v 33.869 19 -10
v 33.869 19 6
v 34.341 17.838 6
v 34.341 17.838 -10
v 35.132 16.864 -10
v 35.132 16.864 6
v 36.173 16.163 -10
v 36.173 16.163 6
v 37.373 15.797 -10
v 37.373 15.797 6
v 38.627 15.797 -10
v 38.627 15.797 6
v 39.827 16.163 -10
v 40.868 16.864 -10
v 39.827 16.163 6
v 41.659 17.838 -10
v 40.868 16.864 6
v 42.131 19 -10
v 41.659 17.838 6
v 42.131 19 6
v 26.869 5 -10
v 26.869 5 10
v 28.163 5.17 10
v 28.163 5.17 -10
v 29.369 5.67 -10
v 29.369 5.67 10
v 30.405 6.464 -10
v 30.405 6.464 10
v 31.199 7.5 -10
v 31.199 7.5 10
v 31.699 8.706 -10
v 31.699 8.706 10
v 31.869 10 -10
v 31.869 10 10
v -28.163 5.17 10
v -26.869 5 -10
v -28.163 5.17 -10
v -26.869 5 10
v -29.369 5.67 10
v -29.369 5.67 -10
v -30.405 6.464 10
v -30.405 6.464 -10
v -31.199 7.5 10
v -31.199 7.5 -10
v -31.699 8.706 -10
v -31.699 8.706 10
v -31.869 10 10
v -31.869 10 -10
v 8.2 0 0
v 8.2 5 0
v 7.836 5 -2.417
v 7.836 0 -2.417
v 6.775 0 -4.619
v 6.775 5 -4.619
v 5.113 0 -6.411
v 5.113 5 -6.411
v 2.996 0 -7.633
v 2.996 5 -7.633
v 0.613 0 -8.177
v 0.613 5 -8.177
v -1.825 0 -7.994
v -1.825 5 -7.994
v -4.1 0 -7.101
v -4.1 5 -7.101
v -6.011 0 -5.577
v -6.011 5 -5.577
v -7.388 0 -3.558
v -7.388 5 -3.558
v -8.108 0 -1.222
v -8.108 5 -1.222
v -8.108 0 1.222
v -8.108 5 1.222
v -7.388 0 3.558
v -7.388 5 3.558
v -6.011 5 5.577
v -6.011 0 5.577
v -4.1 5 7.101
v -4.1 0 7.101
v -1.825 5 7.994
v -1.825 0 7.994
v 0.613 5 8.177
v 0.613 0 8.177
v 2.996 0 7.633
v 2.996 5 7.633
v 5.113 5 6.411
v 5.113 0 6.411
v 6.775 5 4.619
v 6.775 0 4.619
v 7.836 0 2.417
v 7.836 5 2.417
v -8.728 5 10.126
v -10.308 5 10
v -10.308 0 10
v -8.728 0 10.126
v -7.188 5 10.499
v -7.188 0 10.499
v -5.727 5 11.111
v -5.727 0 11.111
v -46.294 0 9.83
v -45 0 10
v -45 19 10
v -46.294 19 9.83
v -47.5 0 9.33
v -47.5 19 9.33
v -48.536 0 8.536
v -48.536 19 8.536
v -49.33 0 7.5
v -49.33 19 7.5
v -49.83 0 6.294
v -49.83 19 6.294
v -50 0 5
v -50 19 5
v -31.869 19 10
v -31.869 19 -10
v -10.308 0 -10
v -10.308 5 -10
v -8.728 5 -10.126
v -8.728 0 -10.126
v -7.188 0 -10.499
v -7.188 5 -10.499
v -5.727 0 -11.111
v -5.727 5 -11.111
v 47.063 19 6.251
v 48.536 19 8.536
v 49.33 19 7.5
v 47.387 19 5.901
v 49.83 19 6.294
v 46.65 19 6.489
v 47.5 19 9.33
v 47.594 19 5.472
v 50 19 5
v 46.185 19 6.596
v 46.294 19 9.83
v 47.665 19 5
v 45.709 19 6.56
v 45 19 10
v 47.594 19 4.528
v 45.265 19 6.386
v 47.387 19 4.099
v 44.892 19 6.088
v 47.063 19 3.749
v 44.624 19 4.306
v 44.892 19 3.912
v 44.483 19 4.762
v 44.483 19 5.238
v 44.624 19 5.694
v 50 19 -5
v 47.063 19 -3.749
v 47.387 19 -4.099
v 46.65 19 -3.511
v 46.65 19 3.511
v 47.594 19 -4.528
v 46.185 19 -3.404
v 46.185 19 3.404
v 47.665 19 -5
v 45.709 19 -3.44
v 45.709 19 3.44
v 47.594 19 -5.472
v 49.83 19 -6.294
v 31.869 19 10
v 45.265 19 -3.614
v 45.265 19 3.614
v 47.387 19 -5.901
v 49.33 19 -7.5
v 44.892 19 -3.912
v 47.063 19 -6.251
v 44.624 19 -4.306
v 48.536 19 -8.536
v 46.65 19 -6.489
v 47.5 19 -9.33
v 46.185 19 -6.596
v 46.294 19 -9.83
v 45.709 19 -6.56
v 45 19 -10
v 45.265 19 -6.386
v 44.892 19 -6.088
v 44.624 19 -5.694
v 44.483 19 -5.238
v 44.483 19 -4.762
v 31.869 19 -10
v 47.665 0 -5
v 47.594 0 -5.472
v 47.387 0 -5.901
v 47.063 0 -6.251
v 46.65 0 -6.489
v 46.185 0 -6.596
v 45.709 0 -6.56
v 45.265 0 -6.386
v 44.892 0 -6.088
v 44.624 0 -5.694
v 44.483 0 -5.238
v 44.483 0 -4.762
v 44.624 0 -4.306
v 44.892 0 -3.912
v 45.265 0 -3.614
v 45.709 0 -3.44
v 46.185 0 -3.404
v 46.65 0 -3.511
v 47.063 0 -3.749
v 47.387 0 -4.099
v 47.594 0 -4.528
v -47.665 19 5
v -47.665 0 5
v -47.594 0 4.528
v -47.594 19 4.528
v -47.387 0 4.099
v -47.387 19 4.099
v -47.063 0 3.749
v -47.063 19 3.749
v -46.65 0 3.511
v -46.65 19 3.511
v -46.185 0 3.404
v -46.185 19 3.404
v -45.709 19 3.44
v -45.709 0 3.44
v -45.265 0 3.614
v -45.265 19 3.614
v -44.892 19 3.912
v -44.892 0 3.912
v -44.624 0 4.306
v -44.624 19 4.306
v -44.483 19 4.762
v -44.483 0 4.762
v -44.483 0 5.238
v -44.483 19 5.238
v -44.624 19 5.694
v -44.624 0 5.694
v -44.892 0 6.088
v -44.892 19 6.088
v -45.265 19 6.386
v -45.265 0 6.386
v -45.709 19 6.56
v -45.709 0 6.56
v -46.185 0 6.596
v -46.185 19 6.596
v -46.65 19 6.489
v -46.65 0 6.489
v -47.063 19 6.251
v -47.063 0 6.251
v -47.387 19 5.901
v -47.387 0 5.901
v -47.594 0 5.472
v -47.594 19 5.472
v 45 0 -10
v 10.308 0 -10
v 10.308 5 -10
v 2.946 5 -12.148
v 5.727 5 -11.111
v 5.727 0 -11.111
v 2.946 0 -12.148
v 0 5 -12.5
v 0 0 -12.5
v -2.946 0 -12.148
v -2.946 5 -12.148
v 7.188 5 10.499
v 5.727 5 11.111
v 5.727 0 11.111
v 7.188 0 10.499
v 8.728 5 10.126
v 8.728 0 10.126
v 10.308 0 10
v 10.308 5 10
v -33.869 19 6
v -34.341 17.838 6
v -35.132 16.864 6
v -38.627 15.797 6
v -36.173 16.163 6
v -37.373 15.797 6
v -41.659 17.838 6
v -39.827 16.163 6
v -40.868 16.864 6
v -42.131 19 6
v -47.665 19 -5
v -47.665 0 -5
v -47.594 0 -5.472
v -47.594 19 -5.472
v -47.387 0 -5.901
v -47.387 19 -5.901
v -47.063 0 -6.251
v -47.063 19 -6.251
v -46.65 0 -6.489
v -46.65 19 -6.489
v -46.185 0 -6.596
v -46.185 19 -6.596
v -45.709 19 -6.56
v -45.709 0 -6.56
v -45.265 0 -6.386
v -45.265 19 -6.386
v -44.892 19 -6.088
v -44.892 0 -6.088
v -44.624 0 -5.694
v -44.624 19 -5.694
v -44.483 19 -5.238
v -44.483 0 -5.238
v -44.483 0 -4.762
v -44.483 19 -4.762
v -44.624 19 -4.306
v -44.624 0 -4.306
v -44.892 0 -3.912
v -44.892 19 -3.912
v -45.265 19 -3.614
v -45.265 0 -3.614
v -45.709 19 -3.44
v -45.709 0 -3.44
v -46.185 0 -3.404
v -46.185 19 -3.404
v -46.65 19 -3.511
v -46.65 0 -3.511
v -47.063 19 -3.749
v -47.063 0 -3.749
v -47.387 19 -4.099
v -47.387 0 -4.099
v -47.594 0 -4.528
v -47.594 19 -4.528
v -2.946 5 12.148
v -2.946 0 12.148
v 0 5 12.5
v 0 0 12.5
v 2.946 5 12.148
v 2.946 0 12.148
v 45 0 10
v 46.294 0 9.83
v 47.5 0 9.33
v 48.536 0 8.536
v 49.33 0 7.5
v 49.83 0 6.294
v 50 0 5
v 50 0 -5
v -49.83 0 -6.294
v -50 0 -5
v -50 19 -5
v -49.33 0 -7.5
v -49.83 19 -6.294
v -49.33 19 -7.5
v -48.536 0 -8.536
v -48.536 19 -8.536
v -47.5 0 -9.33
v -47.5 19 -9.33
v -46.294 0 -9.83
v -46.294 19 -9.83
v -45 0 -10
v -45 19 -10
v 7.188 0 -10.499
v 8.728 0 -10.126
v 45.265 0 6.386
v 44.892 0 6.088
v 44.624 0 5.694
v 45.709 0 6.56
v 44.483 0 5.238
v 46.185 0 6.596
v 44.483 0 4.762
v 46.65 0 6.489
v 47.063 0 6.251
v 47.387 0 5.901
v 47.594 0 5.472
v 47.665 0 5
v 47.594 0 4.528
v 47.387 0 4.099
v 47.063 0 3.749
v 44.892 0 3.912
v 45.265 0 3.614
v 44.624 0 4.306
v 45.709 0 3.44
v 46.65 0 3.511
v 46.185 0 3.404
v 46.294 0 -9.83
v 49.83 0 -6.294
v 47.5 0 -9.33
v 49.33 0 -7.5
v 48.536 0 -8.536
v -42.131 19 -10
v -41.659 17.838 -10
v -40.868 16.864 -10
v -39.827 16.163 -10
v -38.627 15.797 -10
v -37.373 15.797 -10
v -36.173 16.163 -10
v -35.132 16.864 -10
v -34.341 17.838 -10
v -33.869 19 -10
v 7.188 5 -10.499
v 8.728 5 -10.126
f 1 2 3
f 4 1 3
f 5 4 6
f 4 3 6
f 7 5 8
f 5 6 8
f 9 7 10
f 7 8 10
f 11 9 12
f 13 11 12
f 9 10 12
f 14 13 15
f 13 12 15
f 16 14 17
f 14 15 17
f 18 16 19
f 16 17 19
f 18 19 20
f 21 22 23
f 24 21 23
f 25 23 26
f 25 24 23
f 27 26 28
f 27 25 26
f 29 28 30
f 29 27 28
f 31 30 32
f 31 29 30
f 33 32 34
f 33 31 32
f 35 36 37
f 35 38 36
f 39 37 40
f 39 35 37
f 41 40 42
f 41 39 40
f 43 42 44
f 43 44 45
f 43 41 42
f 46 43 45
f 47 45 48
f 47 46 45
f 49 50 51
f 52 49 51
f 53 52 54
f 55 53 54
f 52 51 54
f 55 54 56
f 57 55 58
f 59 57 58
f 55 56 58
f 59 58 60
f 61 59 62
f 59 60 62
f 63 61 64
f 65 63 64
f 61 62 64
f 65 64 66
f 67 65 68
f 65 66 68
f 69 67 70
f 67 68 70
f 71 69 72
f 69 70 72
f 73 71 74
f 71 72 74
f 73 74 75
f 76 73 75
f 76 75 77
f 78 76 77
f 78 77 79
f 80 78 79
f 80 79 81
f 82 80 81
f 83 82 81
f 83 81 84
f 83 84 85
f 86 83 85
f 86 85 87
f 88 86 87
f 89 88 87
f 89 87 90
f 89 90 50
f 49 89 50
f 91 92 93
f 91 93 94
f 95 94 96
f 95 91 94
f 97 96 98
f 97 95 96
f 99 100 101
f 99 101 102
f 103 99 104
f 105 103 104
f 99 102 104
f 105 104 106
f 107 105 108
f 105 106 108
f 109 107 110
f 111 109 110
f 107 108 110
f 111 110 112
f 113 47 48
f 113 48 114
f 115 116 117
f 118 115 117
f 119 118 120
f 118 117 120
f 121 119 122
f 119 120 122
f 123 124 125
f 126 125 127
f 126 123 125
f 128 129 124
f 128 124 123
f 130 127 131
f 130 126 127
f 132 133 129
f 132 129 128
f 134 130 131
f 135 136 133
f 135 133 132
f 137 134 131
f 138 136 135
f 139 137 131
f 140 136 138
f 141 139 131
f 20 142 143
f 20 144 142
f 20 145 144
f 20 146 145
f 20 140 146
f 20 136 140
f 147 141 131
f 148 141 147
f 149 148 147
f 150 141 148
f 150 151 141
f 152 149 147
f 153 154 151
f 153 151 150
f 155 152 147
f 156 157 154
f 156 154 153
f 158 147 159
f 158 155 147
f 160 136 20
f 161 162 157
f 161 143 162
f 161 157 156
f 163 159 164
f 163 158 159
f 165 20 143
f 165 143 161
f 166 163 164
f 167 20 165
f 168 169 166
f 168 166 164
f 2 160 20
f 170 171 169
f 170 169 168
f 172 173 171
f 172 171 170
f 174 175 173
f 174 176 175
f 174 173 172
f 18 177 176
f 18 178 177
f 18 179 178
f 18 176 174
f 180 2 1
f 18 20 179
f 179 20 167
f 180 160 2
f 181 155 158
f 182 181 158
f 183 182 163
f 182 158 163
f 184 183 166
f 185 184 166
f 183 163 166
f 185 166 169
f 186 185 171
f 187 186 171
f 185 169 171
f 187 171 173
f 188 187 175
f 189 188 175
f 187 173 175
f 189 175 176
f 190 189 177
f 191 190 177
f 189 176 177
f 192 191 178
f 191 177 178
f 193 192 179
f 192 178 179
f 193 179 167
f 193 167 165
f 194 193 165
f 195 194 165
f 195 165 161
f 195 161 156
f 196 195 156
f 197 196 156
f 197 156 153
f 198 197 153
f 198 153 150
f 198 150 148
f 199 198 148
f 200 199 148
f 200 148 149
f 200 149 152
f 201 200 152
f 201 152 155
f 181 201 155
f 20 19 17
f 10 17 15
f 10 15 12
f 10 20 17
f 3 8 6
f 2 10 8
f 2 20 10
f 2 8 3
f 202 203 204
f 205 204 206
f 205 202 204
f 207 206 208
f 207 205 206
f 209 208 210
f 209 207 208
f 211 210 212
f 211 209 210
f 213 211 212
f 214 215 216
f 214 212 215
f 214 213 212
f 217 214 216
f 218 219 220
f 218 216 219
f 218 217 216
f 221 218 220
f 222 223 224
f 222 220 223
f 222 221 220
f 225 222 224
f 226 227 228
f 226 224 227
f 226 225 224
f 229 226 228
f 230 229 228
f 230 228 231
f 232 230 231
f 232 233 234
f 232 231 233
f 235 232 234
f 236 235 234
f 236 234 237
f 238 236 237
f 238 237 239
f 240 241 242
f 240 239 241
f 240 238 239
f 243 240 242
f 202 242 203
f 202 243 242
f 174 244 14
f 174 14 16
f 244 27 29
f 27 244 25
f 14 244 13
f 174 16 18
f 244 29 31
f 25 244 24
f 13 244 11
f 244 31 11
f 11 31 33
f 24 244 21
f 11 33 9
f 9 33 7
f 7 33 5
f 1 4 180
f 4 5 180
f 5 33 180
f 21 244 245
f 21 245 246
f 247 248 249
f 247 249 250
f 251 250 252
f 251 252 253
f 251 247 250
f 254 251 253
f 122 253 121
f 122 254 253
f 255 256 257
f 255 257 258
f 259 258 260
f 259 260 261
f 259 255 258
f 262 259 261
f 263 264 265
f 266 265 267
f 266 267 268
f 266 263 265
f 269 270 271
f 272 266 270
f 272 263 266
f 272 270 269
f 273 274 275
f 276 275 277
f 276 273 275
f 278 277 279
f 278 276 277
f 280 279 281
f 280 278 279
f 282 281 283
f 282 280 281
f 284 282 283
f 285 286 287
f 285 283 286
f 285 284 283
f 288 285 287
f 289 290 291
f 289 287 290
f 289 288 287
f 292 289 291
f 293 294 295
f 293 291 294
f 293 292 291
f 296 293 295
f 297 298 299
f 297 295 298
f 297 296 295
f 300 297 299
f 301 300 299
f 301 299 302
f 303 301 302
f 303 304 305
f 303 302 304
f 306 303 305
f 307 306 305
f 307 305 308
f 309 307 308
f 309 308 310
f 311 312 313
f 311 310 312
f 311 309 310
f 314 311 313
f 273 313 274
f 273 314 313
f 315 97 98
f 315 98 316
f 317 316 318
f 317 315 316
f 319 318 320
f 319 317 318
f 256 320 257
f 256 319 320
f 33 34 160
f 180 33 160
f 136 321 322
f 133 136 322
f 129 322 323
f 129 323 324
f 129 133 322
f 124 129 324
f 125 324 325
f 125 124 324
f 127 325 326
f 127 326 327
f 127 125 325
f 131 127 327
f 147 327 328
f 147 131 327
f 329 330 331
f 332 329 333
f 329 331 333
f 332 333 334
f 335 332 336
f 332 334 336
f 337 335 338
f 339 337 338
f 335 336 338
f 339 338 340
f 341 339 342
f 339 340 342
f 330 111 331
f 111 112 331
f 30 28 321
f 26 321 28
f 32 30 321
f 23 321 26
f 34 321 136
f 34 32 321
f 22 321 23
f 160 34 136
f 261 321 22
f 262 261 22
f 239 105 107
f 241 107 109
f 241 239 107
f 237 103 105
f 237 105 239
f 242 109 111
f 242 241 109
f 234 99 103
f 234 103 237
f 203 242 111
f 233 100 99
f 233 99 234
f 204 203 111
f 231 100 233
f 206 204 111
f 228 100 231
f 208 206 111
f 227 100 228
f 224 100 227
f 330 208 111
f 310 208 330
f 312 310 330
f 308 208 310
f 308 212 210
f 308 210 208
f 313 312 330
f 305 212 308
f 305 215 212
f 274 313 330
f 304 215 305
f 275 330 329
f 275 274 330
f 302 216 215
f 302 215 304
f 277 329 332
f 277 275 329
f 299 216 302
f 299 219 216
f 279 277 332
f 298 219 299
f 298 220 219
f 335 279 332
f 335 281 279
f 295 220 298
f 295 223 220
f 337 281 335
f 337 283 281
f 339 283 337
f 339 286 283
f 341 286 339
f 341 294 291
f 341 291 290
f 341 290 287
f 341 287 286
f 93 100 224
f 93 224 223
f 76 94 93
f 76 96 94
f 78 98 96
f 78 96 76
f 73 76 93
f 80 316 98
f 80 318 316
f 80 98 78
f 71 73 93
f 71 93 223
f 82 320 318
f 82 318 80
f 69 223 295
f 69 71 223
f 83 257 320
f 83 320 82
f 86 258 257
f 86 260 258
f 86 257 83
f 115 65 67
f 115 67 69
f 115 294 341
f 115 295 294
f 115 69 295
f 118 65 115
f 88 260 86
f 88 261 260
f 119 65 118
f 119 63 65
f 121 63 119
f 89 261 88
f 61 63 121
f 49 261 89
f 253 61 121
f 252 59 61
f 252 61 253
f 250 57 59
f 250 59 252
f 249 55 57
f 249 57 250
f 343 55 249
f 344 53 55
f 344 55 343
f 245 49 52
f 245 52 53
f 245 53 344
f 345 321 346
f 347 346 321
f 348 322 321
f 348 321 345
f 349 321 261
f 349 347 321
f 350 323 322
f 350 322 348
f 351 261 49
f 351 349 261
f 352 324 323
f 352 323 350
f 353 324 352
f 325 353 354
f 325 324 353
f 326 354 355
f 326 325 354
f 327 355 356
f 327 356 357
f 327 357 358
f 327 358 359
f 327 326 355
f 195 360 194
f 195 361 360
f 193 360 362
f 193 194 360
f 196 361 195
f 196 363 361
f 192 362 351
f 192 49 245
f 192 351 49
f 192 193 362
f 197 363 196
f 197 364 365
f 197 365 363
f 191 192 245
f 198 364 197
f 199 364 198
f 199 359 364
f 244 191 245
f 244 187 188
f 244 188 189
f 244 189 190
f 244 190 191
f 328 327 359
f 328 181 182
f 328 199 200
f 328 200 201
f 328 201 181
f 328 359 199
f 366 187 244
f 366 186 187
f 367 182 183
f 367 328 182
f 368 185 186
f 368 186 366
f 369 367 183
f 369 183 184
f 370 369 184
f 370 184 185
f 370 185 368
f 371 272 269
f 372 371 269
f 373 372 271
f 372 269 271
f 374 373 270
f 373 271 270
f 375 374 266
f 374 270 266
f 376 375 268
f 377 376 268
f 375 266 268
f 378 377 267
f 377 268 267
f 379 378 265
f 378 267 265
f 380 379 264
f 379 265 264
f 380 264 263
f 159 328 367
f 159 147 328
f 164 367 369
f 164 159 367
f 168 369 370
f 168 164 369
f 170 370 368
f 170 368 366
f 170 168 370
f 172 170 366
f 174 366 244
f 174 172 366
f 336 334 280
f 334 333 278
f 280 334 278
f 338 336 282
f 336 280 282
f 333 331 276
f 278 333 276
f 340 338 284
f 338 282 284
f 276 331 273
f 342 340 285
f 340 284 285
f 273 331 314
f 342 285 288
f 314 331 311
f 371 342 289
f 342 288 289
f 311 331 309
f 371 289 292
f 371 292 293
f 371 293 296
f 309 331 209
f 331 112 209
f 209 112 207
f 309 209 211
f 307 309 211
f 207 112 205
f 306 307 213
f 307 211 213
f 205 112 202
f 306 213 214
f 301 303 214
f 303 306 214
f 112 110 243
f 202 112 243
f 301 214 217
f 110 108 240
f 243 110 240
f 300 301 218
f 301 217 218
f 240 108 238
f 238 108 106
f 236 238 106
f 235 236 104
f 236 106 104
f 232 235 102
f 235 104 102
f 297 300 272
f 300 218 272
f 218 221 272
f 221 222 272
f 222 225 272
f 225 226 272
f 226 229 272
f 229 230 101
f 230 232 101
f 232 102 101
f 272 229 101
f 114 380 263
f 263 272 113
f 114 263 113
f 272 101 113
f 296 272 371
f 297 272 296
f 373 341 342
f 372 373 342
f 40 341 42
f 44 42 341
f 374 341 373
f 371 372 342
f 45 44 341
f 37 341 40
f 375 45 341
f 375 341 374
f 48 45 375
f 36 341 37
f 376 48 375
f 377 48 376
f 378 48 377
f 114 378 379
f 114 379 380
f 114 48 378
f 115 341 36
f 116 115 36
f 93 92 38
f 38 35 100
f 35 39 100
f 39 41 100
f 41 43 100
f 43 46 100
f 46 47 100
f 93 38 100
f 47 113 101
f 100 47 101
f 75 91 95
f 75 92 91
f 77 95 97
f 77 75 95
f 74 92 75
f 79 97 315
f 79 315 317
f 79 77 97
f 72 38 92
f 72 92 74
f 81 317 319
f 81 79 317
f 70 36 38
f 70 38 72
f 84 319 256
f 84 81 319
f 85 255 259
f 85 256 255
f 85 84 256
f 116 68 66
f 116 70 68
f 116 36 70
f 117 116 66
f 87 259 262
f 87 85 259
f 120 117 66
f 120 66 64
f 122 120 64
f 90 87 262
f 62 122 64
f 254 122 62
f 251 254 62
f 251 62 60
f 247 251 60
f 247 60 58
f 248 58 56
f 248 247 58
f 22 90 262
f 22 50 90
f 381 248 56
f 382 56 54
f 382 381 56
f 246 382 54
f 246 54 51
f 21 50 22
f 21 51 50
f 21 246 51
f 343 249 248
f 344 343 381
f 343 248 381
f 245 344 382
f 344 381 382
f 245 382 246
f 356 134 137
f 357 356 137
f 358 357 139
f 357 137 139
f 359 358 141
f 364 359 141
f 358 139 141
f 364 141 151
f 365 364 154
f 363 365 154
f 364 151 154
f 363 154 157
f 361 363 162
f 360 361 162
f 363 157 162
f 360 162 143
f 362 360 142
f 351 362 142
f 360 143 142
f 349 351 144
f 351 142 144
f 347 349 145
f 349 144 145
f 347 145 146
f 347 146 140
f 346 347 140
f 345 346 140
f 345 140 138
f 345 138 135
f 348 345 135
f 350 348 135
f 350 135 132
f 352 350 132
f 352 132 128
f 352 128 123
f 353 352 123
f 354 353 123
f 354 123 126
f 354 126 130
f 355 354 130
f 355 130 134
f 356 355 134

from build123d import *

# Parameters (mm, degrees)
SKETCH1_W               = 88
SKETCH1_H               = 20
BOSS_EXTRUDE1_DEPTH     = 40
SKETCH2_R               = 4.25
CUT_EXTRUDE1_DEPTH      = 21
SKETCH7_R               = 12.5
BOSS_EXTRUDE2_DEPTH     = 40
SKETCH4_R               = 8.2
CUT_EXTRUDE3_DEPTH      = 41
FILLET2_R               = 10
SKETCH9_W               = 27
SKETCH9_H               = 21
CUT_EXTRUDE4_DEPTH      = 89
SKETCH10_W              = 63.73864418
SKETCH10_H              = 16
CUT_EXTRUDE5_DEPTH      = 13.5
CUT_EXTRUDE5_DEPTH_BACK = 13.5
FILLET3_R               = 5
SKETCH11_W              = 20
SKETCH11_H              = 19
BOSS_EXTRUDE3_DEPTH     = 6
SKETCH12_R              = 1.6
CUT_EXTRUDE6_DEPTH      = 20
FILLET5_R               = 5
BOSS_EXTRUDE4_DEPTH     = 4


with BuildPart() as part:
    # Sketch1 → Boss-Extrude1 (new body)
    with BuildSketch(Plane(origin=(0, 0, 0), x_dir=(1, 0, 0), z_dir=(0, 1, 0))):
        Rectangle(SKETCH1_W, SKETCH1_H)
    extrude(amount=BOSS_EXTRUDE1_DEPTH)

    # Sketch2 → Cut-Extrude1 (cut, through all)
    with BuildSketch(Plane.XY.offset(10)):
        with Locations((-38, 20)):
            Circle(SKETCH2_R)
        with Locations((38, 20)):
            Circle(SKETCH2_R)
    extrude(amount=-CUT_EXTRUDE1_DEPTH, mode=Mode.SUBTRACT)

    # Sketch7 → Boss-Extrude2 (add)
    with BuildSketch(Plane(origin=(0, 40, 0), x_dir=(1, 0, 0), z_dir=(0, 1, 0))):
        Circle(SKETCH7_R)
    extrude(amount=-BOSS_EXTRUDE2_DEPTH)

    # Sketch4 → Cut-Extrude3 (cut, through all)
    with BuildSketch(Plane(origin=(0, 40, 0), x_dir=(1, 0, 0), z_dir=(0, 1, 0))):
        Circle(SKETCH4_R)
    extrude(amount=-CUT_EXTRUDE3_DEPTH, mode=Mode.SUBTRACT)

    # Fillet2
    fillet2_edges = [part.edges().sort_by_distance(p)[0] for p in [
        (7.5, 20, -10),
        (7.5, 20, 10),
        (-7.5, 20, -10),
        (-7.5, 20, 10),
    ]]
    fillet(fillet2_edges, radius=FILLET2_R)

    # Sketch9 → Cut-Extrude4 (cut, through all)
    with BuildSketch(Plane.ZY.offset(44)):
        with Locations((0, 29.5)):
            Rectangle(SKETCH9_W, SKETCH9_H)
    extrude(amount=-CUT_EXTRUDE4_DEPTH, mode=Mode.SUBTRACT)

    # Sketch10 → Cut-Extrude5 (cut, two sides)
    with BuildSketch(Plane.XY) as cut_extrude5_sk:
        with Locations((0, 13)):
            Rectangle(SKETCH10_W, SKETCH10_H)
    extrude(amount=CUT_EXTRUDE5_DEPTH, mode=Mode.SUBTRACT)
    extrude(cut_extrude5_sk.sketch, amount=-CUT_EXTRUDE5_DEPTH_BACK, mode=Mode.SUBTRACT)

    # Fillet3
    fillet3_edges = [part.edges().sort_by_distance(p)[0] for p in [
        (31.86932209, 5, 0),
        (-31.86932209, 5, 0),
    ]]
    fillet(fillet3_edges, radius=FILLET3_R)

    # Sketch11 → Boss-Extrude3 (add)
    with BuildSketch(Plane(origin=(44, 0, 0), x_dir=(0, 0, -1), z_dir=(1, 0, 0))):
        with Locations((0, 9.5)):
            Rectangle(SKETCH11_W, SKETCH11_H)
    boss_extrude3 = extrude(amount=BOSS_EXTRUDE3_DEPTH)

    # Sketch12 → Cut-Extrude6 (cut, through all)
    with BuildSketch(Plane(origin=(0, 19, 0), x_dir=(1, 0, 0), z_dir=(0, 1, 0))):
        with Locations((46.065338955, 5)):
            Circle(SKETCH12_R)
        with Locations((46.065338955, -5)):
            Circle(SKETCH12_R)
    cut_extrude6 = extrude(amount=-CUT_EXTRUDE6_DEPTH, mode=Mode.SUBTRACT)

    # Mirror1: Boss-Extrude3, Cut-Extrude6 across plane
    add(boss_extrude3.mirror(Plane(origin=(0, 0, 0), x_dir=(0, 0, 1), z_dir=(1, 0, 0))))
    add(cut_extrude6.mirror(Plane(origin=(0, 0, 0), x_dir=(0, 0, 1), z_dir=(1, 0, 0))), mode=Mode.SUBTRACT)

    # Fillet5
    fillet5_edges = [part.edges().sort_by_distance(p)[0] for p in [
        (50, 9.5, -10),
        (50, 9.5, 10),
        (-50, 9.5, 10),
        (-50, 9.5, -10),
    ]]
    fillet(fillet5_edges, radius=FILLET5_R)

    # Sketch13 → Boss-Extrude4 (add)
    with BuildSketch(Plane.XY.offset(10)):
        with BuildLine():
            Line((-42.13067791, 19), (-33.86932209, 19))
            ThreePointArc((-33.86932209, 19), (-38, 15.75), (-42.13067791, 19))
        make_face()
        with BuildLine():
            Line((33.86932209, 19), (42.13067791, 19))
            ThreePointArc((42.13067791, 19), (38, 15.75), (33.86932209, 19))
        make_face()
    extrude(amount=-BOSS_EXTRUDE4_DEPTH)


solid = part.part
